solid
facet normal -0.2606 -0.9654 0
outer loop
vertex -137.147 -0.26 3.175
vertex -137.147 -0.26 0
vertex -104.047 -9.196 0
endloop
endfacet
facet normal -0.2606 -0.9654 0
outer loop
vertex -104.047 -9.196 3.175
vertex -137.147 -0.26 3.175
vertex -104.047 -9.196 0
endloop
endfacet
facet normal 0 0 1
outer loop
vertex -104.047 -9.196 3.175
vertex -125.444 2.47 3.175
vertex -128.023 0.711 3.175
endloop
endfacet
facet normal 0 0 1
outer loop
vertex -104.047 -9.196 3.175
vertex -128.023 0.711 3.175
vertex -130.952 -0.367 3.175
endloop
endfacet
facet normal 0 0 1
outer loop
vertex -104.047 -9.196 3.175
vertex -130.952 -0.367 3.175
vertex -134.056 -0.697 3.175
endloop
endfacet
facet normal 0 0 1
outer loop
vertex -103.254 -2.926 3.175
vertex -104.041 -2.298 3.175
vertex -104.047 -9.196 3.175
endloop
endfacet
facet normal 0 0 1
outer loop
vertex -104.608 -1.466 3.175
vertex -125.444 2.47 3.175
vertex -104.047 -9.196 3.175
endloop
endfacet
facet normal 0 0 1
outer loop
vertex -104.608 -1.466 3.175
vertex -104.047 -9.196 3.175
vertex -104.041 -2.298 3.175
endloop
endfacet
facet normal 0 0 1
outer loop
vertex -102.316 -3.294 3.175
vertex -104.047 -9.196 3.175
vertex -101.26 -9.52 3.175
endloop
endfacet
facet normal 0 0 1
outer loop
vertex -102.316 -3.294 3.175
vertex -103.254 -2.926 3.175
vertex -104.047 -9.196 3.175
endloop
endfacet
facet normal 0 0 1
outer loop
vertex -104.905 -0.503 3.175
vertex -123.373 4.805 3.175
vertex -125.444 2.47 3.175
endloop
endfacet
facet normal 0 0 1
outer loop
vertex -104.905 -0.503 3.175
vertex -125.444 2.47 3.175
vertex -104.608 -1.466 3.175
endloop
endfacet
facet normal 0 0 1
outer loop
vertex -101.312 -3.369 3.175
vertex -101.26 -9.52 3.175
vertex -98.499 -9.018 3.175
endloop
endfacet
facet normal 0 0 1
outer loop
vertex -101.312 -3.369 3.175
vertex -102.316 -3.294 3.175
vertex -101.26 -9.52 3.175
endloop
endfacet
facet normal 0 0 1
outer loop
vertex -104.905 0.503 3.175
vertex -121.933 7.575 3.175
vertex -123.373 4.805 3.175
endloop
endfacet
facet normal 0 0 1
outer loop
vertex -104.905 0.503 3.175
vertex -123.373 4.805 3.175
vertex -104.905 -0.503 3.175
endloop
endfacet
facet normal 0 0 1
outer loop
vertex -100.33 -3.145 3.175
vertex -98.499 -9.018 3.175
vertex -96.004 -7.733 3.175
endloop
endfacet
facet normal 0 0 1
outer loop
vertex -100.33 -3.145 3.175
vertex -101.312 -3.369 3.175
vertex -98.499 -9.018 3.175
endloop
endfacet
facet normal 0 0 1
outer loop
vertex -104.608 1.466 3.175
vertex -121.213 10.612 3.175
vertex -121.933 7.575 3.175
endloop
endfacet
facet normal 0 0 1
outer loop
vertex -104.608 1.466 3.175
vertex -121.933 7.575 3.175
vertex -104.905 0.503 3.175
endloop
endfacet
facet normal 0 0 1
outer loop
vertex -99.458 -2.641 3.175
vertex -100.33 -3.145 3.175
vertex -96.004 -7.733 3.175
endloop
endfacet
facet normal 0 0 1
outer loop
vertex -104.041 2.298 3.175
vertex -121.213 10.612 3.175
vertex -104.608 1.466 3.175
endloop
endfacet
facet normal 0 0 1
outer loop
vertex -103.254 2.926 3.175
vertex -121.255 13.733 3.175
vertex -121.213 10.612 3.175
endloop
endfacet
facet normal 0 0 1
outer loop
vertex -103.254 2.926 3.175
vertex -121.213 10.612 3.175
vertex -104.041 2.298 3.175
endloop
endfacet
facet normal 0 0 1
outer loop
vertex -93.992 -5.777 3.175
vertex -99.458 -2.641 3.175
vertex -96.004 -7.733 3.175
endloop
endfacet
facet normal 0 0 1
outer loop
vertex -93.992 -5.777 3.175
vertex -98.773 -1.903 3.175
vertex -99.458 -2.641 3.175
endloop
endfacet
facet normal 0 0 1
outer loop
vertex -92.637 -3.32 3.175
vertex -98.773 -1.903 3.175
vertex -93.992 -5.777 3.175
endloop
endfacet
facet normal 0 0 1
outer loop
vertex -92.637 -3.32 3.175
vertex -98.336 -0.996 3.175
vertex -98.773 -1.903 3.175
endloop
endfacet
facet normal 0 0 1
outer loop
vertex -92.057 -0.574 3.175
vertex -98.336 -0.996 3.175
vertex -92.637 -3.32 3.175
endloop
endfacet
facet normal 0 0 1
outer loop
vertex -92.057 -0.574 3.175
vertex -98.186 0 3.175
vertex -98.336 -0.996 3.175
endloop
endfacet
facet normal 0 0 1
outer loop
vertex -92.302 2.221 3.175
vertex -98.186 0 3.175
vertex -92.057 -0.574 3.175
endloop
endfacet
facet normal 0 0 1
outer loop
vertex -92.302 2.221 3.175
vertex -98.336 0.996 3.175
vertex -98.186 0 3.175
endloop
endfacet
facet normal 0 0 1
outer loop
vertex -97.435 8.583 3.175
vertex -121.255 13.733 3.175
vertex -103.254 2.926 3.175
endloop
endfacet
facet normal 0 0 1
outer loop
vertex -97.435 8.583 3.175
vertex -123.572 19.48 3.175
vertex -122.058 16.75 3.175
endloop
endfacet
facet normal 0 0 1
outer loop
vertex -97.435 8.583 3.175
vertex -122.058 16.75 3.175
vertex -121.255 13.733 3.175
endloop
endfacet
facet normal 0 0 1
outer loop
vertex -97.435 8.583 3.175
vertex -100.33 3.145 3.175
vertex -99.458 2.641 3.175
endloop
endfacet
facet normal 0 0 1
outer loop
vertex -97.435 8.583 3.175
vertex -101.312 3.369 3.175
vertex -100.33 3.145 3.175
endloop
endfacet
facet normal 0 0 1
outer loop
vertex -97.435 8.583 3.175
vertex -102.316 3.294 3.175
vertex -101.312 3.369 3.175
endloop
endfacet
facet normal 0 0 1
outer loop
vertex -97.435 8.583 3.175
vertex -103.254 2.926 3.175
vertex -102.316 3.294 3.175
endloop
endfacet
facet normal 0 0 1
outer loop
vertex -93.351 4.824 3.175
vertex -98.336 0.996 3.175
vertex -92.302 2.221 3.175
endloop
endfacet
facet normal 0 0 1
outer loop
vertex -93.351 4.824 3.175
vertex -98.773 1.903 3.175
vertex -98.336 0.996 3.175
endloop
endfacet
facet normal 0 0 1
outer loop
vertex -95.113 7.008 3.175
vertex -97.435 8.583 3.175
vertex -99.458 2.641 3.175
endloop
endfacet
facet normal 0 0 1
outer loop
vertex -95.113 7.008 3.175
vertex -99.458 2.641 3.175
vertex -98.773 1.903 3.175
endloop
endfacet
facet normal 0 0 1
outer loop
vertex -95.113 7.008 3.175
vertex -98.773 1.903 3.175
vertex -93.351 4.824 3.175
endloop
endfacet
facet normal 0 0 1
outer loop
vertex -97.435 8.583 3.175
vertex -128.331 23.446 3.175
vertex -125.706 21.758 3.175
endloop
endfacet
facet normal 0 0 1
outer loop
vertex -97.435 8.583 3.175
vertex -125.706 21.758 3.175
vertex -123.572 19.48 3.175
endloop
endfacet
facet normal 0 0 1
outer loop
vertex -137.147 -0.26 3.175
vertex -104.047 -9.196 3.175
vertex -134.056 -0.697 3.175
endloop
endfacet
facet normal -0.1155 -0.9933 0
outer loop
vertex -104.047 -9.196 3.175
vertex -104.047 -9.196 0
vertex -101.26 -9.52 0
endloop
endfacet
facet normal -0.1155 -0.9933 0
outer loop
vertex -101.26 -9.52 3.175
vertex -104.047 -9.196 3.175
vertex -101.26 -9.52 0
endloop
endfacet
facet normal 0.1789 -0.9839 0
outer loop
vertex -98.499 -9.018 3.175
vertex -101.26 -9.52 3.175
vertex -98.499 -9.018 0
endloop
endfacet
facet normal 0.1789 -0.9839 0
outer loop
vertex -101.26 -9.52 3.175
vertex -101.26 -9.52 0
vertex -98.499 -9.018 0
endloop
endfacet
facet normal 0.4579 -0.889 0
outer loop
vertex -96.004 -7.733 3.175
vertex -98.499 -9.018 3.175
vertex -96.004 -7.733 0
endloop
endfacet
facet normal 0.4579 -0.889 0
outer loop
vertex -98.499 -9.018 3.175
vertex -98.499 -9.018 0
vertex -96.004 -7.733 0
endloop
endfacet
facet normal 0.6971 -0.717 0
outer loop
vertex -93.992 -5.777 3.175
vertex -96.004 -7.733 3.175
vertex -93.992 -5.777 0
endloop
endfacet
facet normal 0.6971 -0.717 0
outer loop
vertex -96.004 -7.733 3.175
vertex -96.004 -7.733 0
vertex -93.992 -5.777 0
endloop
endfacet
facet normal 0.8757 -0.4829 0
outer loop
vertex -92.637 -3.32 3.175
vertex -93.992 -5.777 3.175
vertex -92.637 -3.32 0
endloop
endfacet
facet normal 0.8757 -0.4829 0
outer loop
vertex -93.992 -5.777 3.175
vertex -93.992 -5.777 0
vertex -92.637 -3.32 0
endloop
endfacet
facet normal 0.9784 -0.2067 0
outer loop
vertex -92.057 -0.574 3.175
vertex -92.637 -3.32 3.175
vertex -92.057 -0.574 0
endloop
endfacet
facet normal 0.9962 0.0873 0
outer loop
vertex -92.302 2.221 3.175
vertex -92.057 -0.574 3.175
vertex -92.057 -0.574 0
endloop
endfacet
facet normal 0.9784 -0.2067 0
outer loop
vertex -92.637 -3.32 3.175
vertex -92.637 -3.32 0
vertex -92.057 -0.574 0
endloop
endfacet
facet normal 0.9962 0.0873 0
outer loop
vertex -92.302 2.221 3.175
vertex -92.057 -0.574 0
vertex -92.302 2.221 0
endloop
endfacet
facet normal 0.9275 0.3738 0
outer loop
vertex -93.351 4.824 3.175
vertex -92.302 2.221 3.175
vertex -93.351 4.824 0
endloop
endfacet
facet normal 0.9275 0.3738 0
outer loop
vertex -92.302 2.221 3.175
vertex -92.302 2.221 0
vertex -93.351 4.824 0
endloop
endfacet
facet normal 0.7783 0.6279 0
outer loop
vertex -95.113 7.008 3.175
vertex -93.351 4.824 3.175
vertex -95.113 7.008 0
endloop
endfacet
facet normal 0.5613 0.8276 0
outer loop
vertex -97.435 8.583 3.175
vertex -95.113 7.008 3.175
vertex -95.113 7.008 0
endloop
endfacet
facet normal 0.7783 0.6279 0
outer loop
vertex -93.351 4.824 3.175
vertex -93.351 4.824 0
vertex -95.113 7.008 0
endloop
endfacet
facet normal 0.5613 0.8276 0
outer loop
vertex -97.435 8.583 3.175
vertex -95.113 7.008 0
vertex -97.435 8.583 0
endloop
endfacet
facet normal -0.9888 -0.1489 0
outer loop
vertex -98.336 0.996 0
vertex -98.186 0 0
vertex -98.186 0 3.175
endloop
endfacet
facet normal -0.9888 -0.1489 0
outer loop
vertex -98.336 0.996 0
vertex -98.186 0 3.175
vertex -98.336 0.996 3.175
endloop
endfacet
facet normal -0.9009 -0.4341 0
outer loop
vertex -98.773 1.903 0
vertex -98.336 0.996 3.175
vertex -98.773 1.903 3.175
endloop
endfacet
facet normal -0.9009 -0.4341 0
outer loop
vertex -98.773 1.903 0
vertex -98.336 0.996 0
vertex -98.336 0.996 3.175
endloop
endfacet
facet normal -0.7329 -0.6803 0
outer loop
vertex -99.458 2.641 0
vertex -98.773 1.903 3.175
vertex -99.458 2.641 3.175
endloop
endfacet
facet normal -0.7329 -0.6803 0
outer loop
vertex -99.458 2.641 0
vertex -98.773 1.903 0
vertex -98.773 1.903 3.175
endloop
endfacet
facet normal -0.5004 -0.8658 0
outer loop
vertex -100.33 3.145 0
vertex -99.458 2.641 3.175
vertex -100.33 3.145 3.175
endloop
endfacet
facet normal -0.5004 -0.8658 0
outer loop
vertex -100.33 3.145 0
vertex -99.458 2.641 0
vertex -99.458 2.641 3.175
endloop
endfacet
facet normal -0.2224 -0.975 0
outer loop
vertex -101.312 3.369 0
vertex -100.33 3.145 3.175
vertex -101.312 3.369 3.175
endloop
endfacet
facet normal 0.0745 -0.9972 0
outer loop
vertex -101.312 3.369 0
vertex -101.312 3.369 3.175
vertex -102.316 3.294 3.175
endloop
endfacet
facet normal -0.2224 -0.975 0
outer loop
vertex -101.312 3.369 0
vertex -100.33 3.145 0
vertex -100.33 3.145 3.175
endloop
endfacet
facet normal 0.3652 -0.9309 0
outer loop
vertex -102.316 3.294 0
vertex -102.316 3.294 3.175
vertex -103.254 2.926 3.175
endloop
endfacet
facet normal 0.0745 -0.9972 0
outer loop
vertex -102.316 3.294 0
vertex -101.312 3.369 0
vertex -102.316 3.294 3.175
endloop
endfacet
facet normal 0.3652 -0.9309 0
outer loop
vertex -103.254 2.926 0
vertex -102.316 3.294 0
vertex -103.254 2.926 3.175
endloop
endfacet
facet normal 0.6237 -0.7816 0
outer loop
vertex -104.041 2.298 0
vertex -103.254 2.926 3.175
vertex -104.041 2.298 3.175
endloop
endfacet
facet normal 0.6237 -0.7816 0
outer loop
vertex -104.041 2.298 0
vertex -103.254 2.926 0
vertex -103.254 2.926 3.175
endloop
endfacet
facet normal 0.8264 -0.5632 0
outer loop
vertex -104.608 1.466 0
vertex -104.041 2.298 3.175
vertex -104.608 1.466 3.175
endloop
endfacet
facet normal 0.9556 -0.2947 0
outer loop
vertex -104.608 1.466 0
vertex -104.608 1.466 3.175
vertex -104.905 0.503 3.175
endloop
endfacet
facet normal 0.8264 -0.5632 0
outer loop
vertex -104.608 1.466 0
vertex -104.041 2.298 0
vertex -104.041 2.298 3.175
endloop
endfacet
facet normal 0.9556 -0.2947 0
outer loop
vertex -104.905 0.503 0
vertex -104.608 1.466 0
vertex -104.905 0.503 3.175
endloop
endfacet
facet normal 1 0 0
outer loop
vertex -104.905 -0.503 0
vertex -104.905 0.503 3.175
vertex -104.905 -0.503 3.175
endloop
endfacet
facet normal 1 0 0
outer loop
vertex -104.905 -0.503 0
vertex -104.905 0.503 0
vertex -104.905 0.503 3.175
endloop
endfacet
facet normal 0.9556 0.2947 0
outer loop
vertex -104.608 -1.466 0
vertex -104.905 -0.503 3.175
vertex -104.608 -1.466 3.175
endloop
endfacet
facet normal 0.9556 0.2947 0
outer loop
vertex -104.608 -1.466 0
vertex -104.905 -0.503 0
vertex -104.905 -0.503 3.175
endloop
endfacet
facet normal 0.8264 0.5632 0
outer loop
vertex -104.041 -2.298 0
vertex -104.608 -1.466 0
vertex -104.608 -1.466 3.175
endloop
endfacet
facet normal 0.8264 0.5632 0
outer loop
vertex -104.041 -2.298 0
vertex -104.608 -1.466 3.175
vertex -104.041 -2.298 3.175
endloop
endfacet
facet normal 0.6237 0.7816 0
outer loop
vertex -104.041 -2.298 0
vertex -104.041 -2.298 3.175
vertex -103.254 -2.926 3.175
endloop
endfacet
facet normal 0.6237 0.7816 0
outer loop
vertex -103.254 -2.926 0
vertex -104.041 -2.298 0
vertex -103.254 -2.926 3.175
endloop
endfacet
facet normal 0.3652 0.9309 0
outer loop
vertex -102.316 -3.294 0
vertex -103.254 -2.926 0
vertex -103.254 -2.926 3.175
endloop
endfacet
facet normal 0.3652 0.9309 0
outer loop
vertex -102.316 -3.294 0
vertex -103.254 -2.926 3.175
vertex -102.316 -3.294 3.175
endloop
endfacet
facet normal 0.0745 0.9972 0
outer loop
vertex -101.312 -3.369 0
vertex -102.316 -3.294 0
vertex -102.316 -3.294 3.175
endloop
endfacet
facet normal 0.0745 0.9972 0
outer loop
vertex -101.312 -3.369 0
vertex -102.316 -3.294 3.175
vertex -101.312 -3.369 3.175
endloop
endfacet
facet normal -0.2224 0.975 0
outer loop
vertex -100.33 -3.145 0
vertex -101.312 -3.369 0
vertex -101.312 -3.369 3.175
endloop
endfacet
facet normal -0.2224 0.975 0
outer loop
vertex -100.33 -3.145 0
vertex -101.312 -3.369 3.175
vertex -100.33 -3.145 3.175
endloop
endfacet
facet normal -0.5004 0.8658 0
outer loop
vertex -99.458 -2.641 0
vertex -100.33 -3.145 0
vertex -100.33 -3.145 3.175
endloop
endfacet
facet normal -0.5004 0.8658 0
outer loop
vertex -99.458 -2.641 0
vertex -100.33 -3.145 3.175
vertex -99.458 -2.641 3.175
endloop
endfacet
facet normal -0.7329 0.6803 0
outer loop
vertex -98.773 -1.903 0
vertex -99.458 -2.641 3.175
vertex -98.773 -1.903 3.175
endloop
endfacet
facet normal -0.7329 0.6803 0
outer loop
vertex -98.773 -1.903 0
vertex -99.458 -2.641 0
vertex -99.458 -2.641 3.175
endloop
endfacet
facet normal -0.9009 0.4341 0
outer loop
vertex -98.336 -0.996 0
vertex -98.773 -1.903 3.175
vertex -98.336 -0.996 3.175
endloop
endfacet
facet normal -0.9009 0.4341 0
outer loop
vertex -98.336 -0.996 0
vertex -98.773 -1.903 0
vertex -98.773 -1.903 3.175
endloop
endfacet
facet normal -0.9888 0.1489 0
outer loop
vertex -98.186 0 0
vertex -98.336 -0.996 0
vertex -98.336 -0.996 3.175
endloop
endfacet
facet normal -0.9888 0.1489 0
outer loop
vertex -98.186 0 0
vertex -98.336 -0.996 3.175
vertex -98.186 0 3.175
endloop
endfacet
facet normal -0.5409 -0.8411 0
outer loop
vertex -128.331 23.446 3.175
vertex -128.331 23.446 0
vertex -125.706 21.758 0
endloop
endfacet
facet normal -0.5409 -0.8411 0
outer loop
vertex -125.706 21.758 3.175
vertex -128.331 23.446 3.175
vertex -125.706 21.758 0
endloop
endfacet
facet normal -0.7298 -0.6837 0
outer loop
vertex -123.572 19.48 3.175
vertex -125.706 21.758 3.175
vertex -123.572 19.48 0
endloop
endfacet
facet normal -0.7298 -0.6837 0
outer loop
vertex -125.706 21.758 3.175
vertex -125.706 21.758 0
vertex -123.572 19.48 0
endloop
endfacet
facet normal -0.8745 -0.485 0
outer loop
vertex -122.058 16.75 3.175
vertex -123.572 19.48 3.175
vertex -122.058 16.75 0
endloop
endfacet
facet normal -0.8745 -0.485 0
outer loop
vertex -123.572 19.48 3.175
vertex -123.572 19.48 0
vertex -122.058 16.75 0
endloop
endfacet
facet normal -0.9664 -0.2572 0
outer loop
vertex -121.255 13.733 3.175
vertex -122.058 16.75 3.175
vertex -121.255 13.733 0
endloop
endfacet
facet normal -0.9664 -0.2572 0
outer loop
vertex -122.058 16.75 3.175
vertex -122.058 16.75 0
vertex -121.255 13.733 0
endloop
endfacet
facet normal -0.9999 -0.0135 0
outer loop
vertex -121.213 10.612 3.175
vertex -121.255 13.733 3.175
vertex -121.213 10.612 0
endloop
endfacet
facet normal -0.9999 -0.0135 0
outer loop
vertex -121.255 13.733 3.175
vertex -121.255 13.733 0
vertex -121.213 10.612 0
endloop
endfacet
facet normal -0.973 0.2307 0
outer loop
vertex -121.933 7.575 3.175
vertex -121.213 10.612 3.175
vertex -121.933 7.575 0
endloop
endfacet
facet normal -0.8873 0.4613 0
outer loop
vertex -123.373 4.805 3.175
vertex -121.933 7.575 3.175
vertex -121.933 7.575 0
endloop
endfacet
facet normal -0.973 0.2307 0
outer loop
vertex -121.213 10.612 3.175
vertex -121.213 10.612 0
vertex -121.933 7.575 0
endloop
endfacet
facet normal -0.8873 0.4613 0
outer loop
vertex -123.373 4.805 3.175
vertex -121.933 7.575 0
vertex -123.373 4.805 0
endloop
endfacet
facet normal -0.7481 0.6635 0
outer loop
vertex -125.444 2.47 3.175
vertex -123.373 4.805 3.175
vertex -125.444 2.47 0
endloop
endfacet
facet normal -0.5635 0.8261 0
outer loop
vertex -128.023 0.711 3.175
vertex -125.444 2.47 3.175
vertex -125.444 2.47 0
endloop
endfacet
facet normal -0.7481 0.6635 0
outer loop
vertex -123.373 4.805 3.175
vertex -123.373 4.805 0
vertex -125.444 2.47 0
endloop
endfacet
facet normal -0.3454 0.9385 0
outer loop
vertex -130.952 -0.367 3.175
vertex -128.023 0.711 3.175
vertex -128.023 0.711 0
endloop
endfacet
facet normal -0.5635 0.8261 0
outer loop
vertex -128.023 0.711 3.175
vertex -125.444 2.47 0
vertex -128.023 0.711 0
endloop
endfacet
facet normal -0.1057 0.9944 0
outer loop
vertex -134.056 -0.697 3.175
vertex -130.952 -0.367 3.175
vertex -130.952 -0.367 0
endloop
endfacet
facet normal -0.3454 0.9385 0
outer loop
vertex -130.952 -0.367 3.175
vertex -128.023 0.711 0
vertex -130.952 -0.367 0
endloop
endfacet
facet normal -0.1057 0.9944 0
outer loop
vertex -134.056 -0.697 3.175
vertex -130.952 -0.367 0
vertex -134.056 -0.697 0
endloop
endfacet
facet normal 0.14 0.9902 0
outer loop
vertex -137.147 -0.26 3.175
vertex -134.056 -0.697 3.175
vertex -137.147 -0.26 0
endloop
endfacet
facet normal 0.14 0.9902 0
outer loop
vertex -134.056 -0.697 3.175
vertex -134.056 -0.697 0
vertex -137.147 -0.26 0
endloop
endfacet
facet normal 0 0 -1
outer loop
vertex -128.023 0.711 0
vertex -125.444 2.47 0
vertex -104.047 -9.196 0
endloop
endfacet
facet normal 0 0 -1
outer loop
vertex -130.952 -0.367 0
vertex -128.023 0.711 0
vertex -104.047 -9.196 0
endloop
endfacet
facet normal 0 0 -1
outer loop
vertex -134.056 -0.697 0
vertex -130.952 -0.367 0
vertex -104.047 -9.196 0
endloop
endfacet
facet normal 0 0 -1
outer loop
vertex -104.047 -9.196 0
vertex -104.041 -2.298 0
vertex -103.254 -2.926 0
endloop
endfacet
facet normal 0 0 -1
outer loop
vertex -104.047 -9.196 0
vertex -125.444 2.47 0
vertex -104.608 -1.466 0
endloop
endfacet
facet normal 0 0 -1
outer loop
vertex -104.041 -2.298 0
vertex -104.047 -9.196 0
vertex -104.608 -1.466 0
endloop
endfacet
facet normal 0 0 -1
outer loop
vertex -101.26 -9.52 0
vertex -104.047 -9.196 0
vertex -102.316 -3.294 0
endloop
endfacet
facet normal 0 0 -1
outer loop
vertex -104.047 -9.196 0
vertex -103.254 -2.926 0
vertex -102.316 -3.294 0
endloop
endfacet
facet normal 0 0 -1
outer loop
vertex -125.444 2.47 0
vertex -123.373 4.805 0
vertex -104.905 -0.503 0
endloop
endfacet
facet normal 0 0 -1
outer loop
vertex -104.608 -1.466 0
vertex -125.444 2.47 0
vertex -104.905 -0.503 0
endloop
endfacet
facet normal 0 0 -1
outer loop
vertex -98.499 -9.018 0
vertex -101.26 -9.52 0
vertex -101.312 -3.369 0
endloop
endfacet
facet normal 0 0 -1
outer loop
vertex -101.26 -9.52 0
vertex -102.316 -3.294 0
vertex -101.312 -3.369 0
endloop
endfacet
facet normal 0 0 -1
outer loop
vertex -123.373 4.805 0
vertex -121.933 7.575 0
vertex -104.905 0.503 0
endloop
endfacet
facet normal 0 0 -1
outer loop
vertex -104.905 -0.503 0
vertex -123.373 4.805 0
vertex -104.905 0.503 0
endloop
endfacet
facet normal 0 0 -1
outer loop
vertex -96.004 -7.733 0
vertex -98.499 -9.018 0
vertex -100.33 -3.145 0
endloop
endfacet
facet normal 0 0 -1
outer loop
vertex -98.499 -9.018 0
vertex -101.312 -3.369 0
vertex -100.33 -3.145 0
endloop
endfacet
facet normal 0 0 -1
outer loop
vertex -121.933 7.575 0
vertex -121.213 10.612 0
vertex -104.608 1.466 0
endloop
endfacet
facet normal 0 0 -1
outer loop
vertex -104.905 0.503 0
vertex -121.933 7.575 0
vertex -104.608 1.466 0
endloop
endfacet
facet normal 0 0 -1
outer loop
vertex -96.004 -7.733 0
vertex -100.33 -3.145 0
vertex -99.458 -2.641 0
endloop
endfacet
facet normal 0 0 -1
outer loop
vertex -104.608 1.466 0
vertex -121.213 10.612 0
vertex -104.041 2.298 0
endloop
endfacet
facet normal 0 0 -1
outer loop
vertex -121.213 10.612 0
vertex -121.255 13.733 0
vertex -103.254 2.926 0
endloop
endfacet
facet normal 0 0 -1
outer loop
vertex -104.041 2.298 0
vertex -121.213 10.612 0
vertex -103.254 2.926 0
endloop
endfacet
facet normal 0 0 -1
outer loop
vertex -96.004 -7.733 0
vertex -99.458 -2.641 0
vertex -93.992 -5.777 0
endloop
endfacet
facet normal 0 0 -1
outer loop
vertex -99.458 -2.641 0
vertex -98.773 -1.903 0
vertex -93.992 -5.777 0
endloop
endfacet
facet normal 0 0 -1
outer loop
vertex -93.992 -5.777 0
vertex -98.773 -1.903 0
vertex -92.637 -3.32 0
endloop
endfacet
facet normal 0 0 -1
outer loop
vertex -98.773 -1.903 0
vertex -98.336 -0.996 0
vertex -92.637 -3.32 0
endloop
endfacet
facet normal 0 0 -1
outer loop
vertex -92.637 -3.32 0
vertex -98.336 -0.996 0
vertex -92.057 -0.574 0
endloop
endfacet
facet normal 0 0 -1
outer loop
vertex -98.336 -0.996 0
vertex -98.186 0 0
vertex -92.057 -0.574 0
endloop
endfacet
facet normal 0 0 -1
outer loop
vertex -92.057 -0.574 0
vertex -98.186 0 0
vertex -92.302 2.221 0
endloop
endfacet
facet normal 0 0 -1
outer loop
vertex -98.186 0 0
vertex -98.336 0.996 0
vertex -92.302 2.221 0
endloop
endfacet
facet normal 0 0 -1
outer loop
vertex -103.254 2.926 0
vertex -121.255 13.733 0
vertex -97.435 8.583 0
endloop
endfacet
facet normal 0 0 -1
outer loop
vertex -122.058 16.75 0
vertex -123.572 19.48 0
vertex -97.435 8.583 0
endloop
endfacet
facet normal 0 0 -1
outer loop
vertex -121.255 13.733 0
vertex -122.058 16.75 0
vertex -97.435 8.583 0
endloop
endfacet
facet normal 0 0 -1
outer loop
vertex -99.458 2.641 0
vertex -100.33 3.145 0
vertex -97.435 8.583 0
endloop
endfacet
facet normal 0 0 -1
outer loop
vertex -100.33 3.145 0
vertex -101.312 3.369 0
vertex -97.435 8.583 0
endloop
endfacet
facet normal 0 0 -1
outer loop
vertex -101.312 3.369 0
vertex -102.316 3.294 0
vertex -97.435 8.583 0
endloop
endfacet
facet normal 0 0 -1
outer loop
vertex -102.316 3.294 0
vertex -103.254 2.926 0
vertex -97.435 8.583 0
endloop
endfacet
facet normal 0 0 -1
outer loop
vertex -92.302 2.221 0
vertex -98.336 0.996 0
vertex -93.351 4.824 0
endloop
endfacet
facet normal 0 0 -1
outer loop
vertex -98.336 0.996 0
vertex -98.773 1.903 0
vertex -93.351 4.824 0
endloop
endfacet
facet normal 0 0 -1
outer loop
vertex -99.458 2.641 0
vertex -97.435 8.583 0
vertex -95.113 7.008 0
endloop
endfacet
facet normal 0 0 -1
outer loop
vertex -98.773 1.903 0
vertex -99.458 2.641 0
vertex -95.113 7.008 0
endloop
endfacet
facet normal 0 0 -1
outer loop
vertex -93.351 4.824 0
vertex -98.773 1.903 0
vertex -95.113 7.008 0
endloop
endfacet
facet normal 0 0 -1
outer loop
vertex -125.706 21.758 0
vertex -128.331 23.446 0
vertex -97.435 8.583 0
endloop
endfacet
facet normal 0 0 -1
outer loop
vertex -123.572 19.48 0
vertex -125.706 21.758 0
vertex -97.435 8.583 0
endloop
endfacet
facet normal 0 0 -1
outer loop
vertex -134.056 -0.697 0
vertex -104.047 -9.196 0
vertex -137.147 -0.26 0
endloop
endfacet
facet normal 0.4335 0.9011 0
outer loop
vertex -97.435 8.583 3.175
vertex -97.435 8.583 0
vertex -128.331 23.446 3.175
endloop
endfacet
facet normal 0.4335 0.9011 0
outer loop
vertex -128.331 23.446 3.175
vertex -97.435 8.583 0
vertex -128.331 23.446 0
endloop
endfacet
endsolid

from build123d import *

# Parameters (mm, degrees)
SKETCH1_R           = 3.3782
BOSS_EXTRUDE1_DEPTH = 3.175


with BuildPart() as part:
    # Sketch1 → Boss-Extrude1 (new body)
    with BuildSketch(Plane.XY):
        with BuildLine():
            ThreePointArc((-104.047091932, -9.195763393), (-92.636784441, -3.320028798), (-97.435324623, 8.583474309))
            Line((-97.435324623, 8.583474309), (-128.331370442, 23.446143348))
            ThreePointArc((-128.331370442, 23.446143348), (-121.933316865, 7.574805873), (-137.147060186, -0.259506921))
            Line((-137.147060186, -0.259506921), (-104.047091932, -9.195763393))
        make_face()
        with Locations((-101.56444, 0)):
            Circle(SKETCH1_R, mode=Mode.SUBTRACT)
    extrude(amount=BOSS_EXTRUDE1_DEPTH)


solid = part.part
